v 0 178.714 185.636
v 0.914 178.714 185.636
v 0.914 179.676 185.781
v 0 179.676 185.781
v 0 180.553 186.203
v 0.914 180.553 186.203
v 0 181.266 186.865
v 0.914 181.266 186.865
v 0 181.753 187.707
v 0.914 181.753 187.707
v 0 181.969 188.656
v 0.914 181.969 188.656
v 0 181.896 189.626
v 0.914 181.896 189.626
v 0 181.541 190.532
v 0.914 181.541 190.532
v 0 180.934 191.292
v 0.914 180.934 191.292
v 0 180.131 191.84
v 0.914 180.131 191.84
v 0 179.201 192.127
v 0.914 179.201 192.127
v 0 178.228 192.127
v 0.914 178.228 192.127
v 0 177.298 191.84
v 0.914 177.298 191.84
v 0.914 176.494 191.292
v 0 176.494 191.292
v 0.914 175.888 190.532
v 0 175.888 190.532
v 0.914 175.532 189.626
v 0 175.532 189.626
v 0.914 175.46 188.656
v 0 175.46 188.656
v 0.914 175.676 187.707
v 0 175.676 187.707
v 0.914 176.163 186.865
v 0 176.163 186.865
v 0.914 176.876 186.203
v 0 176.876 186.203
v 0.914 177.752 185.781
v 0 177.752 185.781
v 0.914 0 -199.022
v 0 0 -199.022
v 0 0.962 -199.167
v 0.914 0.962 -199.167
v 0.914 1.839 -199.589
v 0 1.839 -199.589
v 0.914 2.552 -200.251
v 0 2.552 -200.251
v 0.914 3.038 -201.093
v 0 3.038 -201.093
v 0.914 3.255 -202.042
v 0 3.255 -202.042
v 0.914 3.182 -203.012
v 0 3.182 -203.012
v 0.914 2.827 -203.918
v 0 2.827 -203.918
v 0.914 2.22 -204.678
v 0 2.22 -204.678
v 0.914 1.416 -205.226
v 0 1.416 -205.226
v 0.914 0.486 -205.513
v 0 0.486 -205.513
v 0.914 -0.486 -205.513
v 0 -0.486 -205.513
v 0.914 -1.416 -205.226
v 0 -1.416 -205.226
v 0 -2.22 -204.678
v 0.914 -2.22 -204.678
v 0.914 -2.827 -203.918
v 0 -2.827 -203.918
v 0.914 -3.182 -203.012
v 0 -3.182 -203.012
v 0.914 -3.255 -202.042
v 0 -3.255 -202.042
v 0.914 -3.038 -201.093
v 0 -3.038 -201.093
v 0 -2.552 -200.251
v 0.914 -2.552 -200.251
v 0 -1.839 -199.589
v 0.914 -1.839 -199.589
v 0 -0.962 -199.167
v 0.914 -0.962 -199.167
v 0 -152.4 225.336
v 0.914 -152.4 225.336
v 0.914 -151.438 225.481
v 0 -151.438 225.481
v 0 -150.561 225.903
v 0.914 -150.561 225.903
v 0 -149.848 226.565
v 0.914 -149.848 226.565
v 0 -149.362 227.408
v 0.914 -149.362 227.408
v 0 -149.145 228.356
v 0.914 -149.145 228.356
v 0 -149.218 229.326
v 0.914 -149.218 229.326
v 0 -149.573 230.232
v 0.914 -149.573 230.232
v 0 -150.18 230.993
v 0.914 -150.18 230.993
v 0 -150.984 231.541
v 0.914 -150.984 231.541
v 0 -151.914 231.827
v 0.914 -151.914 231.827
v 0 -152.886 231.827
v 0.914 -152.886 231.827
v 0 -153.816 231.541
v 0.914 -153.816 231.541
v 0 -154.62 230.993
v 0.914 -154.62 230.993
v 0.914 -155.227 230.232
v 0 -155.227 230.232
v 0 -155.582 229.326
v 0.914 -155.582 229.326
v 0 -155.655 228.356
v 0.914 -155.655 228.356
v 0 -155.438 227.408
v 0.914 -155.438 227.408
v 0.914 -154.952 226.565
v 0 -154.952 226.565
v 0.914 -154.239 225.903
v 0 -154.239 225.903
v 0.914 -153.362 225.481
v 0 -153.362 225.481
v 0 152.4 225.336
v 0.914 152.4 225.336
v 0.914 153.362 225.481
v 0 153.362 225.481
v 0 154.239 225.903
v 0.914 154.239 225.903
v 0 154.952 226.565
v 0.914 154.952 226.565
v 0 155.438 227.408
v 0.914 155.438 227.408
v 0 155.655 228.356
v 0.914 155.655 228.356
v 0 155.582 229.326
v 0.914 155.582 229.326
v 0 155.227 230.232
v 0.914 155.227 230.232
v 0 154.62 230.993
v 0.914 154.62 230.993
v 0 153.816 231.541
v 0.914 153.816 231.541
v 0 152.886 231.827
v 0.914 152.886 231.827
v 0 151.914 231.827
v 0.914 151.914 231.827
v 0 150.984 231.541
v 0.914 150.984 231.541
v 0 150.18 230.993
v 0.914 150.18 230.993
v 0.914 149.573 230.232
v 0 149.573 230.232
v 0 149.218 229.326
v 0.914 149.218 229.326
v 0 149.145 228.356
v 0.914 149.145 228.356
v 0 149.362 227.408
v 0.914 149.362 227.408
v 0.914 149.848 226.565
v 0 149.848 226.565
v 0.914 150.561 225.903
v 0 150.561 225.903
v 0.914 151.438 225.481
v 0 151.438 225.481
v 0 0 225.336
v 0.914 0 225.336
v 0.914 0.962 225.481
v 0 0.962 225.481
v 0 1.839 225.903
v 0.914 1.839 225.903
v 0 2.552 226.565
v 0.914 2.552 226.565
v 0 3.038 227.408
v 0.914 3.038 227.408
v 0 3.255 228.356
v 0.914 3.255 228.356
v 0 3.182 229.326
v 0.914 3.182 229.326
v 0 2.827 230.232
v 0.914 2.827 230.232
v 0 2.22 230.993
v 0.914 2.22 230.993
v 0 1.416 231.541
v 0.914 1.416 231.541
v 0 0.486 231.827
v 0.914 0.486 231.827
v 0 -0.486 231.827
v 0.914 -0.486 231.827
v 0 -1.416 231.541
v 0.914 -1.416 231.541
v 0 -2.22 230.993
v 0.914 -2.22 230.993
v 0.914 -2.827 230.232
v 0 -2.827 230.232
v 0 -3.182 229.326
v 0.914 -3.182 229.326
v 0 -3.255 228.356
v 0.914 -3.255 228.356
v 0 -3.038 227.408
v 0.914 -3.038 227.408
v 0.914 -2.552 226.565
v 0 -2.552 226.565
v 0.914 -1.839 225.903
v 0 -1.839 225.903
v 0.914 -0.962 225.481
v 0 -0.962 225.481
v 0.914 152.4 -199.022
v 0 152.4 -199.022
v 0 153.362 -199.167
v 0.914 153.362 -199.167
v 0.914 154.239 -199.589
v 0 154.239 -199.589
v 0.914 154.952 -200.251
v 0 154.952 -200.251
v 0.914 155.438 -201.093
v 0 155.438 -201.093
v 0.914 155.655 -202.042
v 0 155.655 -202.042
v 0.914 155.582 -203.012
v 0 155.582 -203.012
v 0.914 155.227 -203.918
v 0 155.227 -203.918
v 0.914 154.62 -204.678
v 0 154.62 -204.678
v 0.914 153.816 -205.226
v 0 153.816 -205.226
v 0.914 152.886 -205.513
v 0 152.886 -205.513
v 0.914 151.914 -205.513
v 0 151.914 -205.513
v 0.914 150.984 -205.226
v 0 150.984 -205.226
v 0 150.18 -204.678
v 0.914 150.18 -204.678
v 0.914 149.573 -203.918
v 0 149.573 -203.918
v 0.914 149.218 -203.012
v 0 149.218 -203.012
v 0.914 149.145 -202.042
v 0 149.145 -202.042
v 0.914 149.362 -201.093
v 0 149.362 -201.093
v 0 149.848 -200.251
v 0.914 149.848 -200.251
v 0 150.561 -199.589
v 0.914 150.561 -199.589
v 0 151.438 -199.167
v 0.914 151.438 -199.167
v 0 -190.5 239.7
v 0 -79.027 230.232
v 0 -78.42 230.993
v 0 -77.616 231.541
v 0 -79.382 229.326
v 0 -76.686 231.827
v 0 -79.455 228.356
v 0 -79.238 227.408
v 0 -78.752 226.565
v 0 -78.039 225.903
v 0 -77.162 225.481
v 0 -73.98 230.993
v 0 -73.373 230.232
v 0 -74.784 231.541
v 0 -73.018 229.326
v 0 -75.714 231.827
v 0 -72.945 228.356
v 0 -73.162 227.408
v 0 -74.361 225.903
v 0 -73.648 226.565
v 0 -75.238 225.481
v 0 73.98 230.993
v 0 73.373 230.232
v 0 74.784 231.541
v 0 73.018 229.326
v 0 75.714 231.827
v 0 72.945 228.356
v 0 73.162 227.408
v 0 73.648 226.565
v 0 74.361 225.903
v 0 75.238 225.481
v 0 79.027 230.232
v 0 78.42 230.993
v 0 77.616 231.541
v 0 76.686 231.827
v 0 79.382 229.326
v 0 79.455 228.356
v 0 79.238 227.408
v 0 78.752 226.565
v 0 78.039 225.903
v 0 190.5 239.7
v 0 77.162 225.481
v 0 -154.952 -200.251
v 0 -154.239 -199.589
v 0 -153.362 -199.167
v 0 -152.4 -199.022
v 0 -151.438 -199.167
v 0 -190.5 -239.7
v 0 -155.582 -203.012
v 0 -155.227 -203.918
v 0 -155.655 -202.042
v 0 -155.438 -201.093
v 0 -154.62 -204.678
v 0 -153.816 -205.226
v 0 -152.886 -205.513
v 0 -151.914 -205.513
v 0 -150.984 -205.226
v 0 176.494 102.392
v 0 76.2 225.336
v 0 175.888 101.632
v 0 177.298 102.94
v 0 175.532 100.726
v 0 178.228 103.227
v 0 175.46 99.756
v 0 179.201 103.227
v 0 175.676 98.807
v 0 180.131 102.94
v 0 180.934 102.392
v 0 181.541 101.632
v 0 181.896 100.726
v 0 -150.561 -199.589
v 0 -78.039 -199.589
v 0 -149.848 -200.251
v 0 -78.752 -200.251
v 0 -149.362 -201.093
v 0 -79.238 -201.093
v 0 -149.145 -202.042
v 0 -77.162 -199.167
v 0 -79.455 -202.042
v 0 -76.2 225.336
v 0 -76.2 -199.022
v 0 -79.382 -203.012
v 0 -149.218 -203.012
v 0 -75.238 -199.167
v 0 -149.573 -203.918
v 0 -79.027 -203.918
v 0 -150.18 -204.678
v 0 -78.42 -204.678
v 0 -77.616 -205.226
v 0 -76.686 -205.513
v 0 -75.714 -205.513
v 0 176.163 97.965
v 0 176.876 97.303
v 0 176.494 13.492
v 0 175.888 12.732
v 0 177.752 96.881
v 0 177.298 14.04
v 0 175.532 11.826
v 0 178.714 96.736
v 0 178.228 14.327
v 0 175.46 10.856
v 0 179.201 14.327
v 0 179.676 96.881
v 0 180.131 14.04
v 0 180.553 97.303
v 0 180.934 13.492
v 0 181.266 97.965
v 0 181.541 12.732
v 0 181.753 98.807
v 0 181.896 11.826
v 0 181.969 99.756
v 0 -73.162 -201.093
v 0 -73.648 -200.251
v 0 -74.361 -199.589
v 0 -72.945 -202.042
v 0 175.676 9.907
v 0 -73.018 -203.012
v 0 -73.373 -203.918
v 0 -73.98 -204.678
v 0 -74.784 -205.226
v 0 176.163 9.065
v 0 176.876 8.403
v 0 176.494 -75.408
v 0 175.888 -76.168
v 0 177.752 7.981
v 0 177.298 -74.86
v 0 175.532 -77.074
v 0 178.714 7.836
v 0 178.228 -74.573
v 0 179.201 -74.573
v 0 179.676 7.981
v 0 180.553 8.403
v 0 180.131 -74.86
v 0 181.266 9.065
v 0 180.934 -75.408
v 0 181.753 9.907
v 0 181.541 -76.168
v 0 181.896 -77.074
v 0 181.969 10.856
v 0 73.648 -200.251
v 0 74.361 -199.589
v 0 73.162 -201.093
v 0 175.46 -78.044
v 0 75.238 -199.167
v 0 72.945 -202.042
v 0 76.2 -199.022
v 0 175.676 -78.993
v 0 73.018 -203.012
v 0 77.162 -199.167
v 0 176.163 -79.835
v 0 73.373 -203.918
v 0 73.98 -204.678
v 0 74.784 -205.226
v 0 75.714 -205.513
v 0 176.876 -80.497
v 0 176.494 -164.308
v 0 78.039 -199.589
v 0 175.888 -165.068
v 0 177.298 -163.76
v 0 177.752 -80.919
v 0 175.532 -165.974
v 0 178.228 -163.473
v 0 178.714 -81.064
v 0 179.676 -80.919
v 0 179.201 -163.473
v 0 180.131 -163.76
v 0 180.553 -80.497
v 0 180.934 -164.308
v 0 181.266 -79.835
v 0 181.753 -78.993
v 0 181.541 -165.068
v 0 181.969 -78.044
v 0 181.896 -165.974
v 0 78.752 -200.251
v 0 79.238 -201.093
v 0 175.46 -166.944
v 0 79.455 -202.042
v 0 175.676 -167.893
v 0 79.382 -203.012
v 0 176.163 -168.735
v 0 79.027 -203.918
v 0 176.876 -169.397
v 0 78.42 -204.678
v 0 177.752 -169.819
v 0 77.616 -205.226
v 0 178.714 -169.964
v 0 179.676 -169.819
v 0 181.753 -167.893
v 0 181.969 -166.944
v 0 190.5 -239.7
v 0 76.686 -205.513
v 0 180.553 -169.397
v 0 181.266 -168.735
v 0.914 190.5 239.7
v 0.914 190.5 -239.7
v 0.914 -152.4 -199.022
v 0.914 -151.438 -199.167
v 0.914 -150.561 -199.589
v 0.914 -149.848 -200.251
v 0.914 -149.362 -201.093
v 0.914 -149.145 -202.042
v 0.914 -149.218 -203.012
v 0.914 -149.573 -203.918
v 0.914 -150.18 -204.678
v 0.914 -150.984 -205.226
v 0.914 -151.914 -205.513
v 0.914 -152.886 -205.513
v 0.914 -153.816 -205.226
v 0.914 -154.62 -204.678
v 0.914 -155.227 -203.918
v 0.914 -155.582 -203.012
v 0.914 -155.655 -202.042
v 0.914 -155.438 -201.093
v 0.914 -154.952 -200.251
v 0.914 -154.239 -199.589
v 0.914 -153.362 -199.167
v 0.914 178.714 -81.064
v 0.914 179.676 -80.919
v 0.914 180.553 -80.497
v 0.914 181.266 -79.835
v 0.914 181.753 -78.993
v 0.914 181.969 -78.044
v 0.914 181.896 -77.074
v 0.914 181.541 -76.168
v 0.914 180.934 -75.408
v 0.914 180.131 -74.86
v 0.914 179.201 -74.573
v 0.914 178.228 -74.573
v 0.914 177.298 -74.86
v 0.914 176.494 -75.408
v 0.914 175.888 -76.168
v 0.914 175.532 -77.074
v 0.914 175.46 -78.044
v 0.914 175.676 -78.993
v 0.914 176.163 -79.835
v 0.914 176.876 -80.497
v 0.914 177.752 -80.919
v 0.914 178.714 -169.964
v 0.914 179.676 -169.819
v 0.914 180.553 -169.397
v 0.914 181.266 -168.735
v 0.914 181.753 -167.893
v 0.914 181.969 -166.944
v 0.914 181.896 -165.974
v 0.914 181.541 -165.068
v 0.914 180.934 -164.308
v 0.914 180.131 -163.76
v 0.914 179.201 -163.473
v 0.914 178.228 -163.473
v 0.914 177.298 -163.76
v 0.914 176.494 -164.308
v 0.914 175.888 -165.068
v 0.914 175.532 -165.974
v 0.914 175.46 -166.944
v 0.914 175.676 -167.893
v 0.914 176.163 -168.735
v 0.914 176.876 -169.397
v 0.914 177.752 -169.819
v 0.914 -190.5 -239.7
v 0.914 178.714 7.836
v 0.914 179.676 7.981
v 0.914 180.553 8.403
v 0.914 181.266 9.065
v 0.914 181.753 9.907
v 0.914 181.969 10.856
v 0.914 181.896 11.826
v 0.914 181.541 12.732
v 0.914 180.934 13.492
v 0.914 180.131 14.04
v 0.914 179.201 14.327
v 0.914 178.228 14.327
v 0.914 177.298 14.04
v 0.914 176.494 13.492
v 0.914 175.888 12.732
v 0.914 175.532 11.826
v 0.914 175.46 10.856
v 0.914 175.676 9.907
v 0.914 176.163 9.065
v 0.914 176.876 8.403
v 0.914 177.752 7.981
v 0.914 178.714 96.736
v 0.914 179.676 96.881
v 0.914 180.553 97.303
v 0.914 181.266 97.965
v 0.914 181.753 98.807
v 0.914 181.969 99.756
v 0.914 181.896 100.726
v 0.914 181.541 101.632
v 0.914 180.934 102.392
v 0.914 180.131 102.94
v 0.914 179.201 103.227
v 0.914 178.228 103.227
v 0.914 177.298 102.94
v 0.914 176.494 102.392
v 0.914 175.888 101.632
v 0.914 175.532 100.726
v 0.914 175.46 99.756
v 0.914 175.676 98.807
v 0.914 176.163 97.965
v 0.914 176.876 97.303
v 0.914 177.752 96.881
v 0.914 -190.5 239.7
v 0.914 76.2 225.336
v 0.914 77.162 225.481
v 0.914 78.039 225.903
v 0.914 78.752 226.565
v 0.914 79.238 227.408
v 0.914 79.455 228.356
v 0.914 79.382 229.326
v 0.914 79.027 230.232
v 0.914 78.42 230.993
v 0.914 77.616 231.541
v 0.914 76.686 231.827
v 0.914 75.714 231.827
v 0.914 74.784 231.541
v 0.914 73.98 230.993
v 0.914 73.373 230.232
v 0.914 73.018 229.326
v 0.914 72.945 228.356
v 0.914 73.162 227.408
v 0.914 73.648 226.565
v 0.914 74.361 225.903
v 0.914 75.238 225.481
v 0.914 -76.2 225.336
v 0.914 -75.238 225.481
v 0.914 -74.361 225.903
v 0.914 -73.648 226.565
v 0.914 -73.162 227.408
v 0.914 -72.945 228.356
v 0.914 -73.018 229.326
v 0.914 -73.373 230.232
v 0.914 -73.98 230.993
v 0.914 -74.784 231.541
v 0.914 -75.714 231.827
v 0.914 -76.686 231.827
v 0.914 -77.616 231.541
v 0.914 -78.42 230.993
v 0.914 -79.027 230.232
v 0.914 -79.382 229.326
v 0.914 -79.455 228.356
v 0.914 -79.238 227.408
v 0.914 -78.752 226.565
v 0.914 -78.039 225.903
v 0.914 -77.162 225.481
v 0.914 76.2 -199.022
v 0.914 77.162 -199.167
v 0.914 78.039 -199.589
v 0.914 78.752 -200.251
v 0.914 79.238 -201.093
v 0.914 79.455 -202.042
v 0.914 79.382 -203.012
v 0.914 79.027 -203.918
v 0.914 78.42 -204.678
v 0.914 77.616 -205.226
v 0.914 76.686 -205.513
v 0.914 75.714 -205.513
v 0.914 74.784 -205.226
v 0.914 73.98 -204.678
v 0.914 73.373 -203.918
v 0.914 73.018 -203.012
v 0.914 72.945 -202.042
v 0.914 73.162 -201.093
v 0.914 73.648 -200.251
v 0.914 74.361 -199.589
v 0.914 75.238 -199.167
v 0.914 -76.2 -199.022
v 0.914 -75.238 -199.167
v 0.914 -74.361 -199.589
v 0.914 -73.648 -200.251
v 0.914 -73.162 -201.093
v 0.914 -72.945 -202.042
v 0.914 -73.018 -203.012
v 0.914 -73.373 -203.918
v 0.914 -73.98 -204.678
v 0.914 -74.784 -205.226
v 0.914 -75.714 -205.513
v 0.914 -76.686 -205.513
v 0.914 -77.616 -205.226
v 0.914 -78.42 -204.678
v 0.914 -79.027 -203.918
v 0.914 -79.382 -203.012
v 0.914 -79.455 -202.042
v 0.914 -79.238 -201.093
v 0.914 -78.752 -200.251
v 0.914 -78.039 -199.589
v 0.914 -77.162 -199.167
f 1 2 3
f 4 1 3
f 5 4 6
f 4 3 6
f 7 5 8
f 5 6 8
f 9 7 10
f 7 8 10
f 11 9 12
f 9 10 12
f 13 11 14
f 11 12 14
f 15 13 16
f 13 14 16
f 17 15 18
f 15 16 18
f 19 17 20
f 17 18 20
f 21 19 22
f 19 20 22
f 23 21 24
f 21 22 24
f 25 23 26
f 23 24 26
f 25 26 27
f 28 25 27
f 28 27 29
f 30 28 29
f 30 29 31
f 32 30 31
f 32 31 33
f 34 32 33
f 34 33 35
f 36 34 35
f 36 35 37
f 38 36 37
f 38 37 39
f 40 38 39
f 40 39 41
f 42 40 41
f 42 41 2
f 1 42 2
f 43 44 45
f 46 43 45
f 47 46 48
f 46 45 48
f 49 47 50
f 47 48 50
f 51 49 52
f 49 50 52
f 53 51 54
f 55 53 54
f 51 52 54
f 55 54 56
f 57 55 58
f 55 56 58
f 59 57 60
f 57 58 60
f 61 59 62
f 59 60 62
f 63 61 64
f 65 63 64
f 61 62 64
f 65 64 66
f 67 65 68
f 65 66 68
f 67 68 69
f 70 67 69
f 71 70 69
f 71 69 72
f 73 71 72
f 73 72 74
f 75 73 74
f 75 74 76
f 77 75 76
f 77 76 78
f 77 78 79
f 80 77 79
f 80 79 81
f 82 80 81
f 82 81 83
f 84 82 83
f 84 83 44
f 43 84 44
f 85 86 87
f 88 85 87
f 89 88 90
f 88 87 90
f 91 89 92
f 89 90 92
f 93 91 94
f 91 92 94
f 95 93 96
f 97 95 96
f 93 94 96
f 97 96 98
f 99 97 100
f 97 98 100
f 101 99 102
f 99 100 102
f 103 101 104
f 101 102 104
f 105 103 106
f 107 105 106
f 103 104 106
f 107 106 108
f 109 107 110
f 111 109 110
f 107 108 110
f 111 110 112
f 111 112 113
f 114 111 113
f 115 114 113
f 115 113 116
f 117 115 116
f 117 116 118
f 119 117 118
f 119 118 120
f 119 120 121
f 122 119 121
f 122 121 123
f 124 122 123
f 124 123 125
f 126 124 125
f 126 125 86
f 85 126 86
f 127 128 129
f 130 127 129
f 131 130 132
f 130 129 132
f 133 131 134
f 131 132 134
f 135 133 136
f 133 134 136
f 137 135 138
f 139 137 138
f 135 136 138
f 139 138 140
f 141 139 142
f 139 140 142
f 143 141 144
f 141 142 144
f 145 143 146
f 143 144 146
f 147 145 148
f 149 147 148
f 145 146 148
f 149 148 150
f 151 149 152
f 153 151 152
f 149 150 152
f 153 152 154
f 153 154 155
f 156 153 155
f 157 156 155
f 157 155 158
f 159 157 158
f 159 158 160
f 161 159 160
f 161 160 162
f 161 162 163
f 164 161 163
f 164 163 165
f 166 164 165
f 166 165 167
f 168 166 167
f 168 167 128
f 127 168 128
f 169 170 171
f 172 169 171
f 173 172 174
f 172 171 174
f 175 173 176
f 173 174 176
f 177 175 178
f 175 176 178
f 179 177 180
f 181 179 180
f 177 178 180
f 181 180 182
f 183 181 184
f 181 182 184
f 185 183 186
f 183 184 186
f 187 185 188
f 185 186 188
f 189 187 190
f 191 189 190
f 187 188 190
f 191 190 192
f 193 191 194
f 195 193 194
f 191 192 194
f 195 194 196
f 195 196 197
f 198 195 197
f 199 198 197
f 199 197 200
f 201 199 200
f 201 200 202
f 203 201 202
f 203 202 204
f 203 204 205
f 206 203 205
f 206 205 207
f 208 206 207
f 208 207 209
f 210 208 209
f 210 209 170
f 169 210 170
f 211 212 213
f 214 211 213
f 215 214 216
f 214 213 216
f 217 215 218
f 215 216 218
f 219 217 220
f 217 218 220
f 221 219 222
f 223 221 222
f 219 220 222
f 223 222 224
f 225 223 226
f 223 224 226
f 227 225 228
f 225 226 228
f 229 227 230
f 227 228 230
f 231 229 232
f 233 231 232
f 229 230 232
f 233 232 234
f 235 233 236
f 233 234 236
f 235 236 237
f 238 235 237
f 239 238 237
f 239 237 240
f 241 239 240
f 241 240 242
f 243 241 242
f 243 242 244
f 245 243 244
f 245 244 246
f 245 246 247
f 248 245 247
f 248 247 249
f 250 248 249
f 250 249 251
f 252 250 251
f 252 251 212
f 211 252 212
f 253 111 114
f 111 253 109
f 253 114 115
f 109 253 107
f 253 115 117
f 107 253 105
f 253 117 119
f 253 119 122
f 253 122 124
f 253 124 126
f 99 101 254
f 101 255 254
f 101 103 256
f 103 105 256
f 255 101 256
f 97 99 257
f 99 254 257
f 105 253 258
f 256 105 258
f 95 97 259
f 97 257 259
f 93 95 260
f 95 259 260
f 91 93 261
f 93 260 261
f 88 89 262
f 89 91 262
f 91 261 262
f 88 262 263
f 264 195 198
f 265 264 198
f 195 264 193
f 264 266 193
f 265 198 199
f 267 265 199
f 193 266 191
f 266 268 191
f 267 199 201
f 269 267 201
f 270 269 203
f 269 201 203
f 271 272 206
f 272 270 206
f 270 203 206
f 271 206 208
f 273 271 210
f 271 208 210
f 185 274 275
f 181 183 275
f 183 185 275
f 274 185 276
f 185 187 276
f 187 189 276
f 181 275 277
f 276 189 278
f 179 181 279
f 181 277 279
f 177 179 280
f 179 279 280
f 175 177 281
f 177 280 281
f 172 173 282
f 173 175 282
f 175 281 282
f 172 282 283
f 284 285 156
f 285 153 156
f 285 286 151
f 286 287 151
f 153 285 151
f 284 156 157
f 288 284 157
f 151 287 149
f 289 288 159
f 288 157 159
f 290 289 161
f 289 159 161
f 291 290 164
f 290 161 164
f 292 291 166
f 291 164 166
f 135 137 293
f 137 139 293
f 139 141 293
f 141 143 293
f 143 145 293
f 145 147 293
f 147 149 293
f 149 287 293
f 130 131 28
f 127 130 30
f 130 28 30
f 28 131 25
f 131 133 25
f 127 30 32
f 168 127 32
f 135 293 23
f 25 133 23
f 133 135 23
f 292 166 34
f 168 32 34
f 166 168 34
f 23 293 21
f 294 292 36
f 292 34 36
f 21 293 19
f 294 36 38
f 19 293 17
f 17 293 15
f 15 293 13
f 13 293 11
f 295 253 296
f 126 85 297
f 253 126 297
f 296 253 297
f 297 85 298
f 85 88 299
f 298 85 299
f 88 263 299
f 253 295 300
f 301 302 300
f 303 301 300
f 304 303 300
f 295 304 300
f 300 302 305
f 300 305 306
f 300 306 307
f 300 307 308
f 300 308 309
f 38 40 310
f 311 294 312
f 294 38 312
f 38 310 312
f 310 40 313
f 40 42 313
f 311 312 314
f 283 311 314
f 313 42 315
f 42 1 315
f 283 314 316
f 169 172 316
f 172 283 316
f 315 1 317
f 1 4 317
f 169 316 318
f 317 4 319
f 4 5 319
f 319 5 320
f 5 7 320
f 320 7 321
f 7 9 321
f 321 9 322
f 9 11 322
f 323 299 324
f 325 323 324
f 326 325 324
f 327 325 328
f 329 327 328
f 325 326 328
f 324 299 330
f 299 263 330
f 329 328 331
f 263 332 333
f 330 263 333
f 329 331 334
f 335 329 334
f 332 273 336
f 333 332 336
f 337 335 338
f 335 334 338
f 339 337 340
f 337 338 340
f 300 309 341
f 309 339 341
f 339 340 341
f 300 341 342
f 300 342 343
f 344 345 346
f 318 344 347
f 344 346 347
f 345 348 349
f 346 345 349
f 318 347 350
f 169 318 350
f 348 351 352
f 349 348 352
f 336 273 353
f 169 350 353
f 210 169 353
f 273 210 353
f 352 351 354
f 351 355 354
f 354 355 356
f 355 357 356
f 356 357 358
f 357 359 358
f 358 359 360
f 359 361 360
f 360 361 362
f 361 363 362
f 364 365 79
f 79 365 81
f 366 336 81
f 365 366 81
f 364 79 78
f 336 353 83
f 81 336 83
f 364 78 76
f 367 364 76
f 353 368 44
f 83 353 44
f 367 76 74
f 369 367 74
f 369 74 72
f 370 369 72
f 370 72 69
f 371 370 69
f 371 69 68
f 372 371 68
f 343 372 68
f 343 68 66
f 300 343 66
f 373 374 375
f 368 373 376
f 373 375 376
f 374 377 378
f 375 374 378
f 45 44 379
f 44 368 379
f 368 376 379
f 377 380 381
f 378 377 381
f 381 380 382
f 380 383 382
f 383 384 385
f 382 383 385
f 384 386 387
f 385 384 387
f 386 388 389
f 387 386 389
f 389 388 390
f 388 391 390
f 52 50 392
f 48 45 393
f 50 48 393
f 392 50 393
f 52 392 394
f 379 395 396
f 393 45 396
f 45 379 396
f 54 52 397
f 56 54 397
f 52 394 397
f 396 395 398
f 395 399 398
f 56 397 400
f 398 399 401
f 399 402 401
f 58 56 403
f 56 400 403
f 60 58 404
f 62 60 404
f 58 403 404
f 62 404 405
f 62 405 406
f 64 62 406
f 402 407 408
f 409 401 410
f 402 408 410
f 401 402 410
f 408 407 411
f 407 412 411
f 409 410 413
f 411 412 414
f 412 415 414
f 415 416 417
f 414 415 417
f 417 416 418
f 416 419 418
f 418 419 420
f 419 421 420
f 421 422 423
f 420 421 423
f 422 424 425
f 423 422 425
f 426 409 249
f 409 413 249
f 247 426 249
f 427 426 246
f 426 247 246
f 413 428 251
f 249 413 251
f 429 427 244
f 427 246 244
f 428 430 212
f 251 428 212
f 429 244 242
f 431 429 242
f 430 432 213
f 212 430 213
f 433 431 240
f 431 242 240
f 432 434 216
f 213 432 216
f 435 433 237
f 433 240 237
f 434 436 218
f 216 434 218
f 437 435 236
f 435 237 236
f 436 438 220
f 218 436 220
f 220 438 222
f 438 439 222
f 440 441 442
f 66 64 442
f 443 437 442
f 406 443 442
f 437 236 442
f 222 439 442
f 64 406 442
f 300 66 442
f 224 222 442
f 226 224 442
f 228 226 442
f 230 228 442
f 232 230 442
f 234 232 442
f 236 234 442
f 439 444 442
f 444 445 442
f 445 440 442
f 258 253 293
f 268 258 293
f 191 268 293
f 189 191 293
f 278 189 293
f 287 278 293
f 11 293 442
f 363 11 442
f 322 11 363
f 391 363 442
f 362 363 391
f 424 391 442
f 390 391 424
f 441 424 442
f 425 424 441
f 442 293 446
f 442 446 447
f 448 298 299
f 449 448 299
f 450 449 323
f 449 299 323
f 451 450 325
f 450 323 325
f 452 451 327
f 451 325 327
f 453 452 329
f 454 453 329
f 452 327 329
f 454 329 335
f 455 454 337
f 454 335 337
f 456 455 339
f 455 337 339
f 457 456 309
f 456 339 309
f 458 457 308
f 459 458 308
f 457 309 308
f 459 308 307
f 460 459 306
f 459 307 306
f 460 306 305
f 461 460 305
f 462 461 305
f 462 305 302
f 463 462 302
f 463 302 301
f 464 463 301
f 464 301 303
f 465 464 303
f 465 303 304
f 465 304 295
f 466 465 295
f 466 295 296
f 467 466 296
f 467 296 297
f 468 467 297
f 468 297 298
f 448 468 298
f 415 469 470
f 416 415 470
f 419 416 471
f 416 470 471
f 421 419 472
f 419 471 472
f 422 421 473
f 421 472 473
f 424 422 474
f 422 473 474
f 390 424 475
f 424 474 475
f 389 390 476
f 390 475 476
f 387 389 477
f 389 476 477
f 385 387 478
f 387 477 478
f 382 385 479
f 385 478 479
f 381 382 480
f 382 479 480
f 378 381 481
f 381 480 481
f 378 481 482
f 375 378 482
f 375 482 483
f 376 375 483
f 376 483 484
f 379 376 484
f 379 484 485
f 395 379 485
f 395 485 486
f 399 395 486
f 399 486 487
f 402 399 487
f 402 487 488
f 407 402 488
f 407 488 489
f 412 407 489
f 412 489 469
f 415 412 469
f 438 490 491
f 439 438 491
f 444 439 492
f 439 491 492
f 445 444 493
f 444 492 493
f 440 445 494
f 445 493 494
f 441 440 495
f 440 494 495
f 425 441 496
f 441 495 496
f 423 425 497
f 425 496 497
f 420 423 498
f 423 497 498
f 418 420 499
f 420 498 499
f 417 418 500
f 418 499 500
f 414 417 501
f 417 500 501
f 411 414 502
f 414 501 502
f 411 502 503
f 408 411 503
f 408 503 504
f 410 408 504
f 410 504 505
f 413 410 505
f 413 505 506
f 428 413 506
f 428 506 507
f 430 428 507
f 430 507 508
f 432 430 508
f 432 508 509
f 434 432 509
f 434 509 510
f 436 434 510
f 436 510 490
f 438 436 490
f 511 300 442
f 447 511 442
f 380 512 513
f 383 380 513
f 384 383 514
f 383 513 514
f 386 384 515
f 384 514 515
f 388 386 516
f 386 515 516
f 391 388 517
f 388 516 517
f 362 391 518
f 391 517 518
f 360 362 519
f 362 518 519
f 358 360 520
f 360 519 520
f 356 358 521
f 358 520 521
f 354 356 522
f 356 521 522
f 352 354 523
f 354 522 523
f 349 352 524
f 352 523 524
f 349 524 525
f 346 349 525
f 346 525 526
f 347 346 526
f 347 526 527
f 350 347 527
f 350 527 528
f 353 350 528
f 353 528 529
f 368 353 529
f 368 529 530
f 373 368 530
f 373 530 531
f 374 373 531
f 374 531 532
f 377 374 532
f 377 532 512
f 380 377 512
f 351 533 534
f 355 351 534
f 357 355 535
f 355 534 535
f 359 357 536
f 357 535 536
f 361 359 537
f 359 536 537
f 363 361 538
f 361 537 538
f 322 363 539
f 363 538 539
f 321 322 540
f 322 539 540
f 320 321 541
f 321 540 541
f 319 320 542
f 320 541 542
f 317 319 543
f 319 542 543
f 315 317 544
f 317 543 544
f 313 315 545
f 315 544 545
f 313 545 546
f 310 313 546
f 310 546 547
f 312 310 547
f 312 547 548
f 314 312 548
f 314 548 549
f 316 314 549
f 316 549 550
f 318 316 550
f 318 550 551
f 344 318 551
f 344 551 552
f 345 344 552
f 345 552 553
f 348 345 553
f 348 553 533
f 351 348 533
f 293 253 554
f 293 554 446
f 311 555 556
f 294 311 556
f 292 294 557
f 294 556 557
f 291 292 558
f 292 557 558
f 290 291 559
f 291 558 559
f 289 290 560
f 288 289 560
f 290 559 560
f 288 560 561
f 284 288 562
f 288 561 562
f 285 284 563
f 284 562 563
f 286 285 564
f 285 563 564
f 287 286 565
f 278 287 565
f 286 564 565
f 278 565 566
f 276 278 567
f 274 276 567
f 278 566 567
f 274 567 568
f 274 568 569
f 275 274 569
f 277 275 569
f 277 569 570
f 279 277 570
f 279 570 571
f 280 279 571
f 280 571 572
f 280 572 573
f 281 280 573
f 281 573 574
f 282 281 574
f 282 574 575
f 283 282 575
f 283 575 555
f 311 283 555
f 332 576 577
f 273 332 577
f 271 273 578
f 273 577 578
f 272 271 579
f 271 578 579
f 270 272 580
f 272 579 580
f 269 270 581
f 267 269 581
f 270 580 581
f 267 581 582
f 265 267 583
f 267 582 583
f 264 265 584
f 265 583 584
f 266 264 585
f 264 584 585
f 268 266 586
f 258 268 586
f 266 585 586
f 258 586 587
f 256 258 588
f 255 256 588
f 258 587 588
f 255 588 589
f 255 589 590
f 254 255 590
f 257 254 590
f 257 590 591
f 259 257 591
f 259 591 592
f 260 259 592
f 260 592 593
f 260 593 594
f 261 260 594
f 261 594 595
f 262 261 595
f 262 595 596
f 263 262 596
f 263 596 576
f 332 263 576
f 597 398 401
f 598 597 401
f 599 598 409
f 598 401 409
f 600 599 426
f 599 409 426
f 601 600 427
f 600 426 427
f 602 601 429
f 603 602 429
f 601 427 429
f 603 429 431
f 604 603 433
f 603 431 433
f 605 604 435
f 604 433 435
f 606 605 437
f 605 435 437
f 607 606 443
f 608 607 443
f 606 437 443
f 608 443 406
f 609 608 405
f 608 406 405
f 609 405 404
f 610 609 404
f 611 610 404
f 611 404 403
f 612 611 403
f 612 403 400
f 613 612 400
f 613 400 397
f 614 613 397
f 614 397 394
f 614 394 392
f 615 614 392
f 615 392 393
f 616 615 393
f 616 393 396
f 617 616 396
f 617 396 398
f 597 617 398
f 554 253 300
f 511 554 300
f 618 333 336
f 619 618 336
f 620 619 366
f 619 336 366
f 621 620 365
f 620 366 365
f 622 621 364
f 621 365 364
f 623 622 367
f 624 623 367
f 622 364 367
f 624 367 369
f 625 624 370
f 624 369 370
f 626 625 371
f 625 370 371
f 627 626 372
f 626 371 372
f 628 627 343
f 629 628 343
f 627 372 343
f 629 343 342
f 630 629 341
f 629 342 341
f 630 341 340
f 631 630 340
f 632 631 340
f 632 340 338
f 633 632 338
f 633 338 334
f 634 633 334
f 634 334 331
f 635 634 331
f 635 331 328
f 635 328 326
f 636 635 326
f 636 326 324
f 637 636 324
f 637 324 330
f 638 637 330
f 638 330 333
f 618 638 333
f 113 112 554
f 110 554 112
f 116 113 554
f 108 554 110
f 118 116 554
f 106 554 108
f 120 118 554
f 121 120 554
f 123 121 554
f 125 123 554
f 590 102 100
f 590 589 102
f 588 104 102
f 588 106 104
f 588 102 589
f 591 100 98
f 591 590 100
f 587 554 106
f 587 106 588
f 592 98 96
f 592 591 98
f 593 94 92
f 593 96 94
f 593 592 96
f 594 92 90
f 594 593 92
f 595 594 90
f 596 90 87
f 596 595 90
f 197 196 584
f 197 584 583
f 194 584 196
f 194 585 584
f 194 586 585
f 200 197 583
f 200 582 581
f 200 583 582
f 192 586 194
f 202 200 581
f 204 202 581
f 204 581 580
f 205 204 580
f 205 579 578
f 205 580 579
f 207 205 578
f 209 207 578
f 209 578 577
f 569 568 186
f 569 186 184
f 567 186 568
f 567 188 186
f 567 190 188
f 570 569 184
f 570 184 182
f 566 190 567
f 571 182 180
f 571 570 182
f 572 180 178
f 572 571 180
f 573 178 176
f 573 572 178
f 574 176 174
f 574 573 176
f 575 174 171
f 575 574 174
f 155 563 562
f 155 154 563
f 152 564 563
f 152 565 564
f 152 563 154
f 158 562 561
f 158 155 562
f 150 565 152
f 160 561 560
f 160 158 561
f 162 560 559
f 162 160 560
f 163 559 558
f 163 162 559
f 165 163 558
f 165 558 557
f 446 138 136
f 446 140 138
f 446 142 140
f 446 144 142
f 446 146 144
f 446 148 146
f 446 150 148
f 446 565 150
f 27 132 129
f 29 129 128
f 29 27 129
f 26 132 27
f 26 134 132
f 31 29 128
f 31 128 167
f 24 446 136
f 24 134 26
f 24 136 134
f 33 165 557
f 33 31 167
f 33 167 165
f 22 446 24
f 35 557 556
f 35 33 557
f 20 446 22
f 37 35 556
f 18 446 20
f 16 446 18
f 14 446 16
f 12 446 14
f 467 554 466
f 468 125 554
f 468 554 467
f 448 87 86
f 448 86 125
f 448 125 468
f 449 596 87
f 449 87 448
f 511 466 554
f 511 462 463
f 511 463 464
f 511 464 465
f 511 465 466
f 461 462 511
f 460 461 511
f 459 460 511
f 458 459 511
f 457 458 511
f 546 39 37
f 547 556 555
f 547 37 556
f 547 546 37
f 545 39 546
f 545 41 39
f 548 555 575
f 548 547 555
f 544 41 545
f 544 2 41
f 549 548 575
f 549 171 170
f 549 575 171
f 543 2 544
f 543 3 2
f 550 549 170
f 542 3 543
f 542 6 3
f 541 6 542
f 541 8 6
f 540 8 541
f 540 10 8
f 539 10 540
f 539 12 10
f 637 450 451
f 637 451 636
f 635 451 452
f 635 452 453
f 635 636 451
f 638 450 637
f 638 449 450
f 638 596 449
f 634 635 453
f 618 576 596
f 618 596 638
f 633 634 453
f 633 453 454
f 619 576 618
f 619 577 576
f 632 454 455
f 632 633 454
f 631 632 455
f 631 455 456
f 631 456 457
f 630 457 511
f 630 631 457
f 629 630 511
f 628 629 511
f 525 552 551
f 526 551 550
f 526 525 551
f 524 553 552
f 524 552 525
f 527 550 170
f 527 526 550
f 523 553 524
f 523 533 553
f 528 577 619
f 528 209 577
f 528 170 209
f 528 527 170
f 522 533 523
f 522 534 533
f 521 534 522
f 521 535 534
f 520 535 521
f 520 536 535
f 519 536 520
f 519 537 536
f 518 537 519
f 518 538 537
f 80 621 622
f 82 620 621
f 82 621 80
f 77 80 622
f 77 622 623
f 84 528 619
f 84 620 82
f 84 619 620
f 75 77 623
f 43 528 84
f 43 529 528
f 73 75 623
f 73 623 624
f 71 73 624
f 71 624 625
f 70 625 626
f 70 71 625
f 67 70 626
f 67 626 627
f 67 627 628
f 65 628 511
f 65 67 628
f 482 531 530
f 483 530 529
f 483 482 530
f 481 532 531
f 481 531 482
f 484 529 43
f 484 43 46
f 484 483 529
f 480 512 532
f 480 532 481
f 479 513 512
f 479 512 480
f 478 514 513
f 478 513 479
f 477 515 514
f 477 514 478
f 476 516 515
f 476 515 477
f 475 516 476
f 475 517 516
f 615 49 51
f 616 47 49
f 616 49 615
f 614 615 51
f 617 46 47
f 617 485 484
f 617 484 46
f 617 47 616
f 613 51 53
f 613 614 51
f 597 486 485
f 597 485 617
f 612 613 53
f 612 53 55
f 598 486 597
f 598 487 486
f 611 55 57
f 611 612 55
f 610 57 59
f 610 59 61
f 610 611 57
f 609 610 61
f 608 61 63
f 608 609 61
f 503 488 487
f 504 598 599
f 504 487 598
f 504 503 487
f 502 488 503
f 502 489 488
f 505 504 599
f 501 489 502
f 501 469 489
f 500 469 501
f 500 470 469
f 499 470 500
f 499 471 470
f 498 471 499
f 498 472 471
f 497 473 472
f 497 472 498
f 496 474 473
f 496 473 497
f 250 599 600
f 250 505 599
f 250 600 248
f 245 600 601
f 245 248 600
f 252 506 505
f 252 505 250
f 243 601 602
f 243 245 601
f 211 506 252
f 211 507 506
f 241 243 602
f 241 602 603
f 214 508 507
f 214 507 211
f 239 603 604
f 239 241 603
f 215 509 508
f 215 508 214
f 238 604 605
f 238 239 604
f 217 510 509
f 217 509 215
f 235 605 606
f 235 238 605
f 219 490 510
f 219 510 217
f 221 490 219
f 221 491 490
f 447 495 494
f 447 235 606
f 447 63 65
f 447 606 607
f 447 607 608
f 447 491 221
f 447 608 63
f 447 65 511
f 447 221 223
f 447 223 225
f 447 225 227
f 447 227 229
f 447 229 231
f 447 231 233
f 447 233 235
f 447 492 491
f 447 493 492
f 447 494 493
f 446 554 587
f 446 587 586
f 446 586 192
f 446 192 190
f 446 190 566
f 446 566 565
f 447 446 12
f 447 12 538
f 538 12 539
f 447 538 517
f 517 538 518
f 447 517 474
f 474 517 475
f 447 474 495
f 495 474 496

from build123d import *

# Parameters (mm, degrees)
SKETCH1_W                = 479.3996
SKETCH1_H                = 381
BOSS_EXTRUDE1_DEPTH      = 0.9144
F_0_257_DIAMETER_HOLE1_D = 6.5278
SKETCH4_R                = 3.2639
CUT_EXTRUDE1_DEPTH       = 2.54
SKETCH5_R                = 3.2639
CUT_EXTRUDE2_DEPTH       = 2.54


with BuildPart() as part:
    # Sketch1 → Boss-Extrude1 (new body)
    with BuildSketch(Plane(origin=(0, 0, 0), x_dir=(0, 0, -1), z_dir=(1, 0, 0))):
        Rectangle(SKETCH1_W, SKETCH1_H)
    extrude(amount=BOSS_EXTRUDE1_DEPTH)

    # F (0.257) Diameter Hole1 (through all)
    with Locations(Plane.ZY):
        with Locations((188.8998, 178.7144), (99.9998, 178.7144), (11.0998, 178.7144), (-77.8002, 178.7144), (-166.7002, 178.7144)):
            Hole(F_0_257_DIAMETER_HOLE1_D / 2)

    # Sketch4 → Cut-Extrude1 (cut)
    with BuildSketch(Plane(origin=(0.9144, 0, 0), x_dir=(0, 0, -1), z_dir=(1, 0, 0))):
        with Locations((-228.6, 152.4)):
            Circle(SKETCH4_R)
        with Locations((-228.6, 76.2)):
            Circle(SKETCH4_R)
        with Locations((-228.6, 0)):
            Circle(SKETCH4_R)
        with Locations((-228.6, -76.2)):
            Circle(SKETCH4_R)
        with Locations((-228.6, -152.4)):
            Circle(SKETCH4_R)
    extrude(amount=-CUT_EXTRUDE1_DEPTH, mode=Mode.SUBTRACT)

    # Sketch5 → Cut-Extrude2 (cut)
    with BuildSketch(Plane.ZY):
        with Locations((-202.2856, 152.4)):
            Circle(SKETCH5_R)
        with Locations((-202.2856, 76.2)):
            Circle(SKETCH5_R)
        with Locations((-202.2856, 0)):
            Circle(SKETCH5_R)
        with Locations((-202.2856, -76.2)):
            Circle(SKETCH5_R)
        with Locations((-202.2856, -152.4)):
            Circle(SKETCH5_R)
    extrude(amount=-CUT_EXTRUDE2_DEPTH, mode=Mode.SUBTRACT)


solid = part.part
